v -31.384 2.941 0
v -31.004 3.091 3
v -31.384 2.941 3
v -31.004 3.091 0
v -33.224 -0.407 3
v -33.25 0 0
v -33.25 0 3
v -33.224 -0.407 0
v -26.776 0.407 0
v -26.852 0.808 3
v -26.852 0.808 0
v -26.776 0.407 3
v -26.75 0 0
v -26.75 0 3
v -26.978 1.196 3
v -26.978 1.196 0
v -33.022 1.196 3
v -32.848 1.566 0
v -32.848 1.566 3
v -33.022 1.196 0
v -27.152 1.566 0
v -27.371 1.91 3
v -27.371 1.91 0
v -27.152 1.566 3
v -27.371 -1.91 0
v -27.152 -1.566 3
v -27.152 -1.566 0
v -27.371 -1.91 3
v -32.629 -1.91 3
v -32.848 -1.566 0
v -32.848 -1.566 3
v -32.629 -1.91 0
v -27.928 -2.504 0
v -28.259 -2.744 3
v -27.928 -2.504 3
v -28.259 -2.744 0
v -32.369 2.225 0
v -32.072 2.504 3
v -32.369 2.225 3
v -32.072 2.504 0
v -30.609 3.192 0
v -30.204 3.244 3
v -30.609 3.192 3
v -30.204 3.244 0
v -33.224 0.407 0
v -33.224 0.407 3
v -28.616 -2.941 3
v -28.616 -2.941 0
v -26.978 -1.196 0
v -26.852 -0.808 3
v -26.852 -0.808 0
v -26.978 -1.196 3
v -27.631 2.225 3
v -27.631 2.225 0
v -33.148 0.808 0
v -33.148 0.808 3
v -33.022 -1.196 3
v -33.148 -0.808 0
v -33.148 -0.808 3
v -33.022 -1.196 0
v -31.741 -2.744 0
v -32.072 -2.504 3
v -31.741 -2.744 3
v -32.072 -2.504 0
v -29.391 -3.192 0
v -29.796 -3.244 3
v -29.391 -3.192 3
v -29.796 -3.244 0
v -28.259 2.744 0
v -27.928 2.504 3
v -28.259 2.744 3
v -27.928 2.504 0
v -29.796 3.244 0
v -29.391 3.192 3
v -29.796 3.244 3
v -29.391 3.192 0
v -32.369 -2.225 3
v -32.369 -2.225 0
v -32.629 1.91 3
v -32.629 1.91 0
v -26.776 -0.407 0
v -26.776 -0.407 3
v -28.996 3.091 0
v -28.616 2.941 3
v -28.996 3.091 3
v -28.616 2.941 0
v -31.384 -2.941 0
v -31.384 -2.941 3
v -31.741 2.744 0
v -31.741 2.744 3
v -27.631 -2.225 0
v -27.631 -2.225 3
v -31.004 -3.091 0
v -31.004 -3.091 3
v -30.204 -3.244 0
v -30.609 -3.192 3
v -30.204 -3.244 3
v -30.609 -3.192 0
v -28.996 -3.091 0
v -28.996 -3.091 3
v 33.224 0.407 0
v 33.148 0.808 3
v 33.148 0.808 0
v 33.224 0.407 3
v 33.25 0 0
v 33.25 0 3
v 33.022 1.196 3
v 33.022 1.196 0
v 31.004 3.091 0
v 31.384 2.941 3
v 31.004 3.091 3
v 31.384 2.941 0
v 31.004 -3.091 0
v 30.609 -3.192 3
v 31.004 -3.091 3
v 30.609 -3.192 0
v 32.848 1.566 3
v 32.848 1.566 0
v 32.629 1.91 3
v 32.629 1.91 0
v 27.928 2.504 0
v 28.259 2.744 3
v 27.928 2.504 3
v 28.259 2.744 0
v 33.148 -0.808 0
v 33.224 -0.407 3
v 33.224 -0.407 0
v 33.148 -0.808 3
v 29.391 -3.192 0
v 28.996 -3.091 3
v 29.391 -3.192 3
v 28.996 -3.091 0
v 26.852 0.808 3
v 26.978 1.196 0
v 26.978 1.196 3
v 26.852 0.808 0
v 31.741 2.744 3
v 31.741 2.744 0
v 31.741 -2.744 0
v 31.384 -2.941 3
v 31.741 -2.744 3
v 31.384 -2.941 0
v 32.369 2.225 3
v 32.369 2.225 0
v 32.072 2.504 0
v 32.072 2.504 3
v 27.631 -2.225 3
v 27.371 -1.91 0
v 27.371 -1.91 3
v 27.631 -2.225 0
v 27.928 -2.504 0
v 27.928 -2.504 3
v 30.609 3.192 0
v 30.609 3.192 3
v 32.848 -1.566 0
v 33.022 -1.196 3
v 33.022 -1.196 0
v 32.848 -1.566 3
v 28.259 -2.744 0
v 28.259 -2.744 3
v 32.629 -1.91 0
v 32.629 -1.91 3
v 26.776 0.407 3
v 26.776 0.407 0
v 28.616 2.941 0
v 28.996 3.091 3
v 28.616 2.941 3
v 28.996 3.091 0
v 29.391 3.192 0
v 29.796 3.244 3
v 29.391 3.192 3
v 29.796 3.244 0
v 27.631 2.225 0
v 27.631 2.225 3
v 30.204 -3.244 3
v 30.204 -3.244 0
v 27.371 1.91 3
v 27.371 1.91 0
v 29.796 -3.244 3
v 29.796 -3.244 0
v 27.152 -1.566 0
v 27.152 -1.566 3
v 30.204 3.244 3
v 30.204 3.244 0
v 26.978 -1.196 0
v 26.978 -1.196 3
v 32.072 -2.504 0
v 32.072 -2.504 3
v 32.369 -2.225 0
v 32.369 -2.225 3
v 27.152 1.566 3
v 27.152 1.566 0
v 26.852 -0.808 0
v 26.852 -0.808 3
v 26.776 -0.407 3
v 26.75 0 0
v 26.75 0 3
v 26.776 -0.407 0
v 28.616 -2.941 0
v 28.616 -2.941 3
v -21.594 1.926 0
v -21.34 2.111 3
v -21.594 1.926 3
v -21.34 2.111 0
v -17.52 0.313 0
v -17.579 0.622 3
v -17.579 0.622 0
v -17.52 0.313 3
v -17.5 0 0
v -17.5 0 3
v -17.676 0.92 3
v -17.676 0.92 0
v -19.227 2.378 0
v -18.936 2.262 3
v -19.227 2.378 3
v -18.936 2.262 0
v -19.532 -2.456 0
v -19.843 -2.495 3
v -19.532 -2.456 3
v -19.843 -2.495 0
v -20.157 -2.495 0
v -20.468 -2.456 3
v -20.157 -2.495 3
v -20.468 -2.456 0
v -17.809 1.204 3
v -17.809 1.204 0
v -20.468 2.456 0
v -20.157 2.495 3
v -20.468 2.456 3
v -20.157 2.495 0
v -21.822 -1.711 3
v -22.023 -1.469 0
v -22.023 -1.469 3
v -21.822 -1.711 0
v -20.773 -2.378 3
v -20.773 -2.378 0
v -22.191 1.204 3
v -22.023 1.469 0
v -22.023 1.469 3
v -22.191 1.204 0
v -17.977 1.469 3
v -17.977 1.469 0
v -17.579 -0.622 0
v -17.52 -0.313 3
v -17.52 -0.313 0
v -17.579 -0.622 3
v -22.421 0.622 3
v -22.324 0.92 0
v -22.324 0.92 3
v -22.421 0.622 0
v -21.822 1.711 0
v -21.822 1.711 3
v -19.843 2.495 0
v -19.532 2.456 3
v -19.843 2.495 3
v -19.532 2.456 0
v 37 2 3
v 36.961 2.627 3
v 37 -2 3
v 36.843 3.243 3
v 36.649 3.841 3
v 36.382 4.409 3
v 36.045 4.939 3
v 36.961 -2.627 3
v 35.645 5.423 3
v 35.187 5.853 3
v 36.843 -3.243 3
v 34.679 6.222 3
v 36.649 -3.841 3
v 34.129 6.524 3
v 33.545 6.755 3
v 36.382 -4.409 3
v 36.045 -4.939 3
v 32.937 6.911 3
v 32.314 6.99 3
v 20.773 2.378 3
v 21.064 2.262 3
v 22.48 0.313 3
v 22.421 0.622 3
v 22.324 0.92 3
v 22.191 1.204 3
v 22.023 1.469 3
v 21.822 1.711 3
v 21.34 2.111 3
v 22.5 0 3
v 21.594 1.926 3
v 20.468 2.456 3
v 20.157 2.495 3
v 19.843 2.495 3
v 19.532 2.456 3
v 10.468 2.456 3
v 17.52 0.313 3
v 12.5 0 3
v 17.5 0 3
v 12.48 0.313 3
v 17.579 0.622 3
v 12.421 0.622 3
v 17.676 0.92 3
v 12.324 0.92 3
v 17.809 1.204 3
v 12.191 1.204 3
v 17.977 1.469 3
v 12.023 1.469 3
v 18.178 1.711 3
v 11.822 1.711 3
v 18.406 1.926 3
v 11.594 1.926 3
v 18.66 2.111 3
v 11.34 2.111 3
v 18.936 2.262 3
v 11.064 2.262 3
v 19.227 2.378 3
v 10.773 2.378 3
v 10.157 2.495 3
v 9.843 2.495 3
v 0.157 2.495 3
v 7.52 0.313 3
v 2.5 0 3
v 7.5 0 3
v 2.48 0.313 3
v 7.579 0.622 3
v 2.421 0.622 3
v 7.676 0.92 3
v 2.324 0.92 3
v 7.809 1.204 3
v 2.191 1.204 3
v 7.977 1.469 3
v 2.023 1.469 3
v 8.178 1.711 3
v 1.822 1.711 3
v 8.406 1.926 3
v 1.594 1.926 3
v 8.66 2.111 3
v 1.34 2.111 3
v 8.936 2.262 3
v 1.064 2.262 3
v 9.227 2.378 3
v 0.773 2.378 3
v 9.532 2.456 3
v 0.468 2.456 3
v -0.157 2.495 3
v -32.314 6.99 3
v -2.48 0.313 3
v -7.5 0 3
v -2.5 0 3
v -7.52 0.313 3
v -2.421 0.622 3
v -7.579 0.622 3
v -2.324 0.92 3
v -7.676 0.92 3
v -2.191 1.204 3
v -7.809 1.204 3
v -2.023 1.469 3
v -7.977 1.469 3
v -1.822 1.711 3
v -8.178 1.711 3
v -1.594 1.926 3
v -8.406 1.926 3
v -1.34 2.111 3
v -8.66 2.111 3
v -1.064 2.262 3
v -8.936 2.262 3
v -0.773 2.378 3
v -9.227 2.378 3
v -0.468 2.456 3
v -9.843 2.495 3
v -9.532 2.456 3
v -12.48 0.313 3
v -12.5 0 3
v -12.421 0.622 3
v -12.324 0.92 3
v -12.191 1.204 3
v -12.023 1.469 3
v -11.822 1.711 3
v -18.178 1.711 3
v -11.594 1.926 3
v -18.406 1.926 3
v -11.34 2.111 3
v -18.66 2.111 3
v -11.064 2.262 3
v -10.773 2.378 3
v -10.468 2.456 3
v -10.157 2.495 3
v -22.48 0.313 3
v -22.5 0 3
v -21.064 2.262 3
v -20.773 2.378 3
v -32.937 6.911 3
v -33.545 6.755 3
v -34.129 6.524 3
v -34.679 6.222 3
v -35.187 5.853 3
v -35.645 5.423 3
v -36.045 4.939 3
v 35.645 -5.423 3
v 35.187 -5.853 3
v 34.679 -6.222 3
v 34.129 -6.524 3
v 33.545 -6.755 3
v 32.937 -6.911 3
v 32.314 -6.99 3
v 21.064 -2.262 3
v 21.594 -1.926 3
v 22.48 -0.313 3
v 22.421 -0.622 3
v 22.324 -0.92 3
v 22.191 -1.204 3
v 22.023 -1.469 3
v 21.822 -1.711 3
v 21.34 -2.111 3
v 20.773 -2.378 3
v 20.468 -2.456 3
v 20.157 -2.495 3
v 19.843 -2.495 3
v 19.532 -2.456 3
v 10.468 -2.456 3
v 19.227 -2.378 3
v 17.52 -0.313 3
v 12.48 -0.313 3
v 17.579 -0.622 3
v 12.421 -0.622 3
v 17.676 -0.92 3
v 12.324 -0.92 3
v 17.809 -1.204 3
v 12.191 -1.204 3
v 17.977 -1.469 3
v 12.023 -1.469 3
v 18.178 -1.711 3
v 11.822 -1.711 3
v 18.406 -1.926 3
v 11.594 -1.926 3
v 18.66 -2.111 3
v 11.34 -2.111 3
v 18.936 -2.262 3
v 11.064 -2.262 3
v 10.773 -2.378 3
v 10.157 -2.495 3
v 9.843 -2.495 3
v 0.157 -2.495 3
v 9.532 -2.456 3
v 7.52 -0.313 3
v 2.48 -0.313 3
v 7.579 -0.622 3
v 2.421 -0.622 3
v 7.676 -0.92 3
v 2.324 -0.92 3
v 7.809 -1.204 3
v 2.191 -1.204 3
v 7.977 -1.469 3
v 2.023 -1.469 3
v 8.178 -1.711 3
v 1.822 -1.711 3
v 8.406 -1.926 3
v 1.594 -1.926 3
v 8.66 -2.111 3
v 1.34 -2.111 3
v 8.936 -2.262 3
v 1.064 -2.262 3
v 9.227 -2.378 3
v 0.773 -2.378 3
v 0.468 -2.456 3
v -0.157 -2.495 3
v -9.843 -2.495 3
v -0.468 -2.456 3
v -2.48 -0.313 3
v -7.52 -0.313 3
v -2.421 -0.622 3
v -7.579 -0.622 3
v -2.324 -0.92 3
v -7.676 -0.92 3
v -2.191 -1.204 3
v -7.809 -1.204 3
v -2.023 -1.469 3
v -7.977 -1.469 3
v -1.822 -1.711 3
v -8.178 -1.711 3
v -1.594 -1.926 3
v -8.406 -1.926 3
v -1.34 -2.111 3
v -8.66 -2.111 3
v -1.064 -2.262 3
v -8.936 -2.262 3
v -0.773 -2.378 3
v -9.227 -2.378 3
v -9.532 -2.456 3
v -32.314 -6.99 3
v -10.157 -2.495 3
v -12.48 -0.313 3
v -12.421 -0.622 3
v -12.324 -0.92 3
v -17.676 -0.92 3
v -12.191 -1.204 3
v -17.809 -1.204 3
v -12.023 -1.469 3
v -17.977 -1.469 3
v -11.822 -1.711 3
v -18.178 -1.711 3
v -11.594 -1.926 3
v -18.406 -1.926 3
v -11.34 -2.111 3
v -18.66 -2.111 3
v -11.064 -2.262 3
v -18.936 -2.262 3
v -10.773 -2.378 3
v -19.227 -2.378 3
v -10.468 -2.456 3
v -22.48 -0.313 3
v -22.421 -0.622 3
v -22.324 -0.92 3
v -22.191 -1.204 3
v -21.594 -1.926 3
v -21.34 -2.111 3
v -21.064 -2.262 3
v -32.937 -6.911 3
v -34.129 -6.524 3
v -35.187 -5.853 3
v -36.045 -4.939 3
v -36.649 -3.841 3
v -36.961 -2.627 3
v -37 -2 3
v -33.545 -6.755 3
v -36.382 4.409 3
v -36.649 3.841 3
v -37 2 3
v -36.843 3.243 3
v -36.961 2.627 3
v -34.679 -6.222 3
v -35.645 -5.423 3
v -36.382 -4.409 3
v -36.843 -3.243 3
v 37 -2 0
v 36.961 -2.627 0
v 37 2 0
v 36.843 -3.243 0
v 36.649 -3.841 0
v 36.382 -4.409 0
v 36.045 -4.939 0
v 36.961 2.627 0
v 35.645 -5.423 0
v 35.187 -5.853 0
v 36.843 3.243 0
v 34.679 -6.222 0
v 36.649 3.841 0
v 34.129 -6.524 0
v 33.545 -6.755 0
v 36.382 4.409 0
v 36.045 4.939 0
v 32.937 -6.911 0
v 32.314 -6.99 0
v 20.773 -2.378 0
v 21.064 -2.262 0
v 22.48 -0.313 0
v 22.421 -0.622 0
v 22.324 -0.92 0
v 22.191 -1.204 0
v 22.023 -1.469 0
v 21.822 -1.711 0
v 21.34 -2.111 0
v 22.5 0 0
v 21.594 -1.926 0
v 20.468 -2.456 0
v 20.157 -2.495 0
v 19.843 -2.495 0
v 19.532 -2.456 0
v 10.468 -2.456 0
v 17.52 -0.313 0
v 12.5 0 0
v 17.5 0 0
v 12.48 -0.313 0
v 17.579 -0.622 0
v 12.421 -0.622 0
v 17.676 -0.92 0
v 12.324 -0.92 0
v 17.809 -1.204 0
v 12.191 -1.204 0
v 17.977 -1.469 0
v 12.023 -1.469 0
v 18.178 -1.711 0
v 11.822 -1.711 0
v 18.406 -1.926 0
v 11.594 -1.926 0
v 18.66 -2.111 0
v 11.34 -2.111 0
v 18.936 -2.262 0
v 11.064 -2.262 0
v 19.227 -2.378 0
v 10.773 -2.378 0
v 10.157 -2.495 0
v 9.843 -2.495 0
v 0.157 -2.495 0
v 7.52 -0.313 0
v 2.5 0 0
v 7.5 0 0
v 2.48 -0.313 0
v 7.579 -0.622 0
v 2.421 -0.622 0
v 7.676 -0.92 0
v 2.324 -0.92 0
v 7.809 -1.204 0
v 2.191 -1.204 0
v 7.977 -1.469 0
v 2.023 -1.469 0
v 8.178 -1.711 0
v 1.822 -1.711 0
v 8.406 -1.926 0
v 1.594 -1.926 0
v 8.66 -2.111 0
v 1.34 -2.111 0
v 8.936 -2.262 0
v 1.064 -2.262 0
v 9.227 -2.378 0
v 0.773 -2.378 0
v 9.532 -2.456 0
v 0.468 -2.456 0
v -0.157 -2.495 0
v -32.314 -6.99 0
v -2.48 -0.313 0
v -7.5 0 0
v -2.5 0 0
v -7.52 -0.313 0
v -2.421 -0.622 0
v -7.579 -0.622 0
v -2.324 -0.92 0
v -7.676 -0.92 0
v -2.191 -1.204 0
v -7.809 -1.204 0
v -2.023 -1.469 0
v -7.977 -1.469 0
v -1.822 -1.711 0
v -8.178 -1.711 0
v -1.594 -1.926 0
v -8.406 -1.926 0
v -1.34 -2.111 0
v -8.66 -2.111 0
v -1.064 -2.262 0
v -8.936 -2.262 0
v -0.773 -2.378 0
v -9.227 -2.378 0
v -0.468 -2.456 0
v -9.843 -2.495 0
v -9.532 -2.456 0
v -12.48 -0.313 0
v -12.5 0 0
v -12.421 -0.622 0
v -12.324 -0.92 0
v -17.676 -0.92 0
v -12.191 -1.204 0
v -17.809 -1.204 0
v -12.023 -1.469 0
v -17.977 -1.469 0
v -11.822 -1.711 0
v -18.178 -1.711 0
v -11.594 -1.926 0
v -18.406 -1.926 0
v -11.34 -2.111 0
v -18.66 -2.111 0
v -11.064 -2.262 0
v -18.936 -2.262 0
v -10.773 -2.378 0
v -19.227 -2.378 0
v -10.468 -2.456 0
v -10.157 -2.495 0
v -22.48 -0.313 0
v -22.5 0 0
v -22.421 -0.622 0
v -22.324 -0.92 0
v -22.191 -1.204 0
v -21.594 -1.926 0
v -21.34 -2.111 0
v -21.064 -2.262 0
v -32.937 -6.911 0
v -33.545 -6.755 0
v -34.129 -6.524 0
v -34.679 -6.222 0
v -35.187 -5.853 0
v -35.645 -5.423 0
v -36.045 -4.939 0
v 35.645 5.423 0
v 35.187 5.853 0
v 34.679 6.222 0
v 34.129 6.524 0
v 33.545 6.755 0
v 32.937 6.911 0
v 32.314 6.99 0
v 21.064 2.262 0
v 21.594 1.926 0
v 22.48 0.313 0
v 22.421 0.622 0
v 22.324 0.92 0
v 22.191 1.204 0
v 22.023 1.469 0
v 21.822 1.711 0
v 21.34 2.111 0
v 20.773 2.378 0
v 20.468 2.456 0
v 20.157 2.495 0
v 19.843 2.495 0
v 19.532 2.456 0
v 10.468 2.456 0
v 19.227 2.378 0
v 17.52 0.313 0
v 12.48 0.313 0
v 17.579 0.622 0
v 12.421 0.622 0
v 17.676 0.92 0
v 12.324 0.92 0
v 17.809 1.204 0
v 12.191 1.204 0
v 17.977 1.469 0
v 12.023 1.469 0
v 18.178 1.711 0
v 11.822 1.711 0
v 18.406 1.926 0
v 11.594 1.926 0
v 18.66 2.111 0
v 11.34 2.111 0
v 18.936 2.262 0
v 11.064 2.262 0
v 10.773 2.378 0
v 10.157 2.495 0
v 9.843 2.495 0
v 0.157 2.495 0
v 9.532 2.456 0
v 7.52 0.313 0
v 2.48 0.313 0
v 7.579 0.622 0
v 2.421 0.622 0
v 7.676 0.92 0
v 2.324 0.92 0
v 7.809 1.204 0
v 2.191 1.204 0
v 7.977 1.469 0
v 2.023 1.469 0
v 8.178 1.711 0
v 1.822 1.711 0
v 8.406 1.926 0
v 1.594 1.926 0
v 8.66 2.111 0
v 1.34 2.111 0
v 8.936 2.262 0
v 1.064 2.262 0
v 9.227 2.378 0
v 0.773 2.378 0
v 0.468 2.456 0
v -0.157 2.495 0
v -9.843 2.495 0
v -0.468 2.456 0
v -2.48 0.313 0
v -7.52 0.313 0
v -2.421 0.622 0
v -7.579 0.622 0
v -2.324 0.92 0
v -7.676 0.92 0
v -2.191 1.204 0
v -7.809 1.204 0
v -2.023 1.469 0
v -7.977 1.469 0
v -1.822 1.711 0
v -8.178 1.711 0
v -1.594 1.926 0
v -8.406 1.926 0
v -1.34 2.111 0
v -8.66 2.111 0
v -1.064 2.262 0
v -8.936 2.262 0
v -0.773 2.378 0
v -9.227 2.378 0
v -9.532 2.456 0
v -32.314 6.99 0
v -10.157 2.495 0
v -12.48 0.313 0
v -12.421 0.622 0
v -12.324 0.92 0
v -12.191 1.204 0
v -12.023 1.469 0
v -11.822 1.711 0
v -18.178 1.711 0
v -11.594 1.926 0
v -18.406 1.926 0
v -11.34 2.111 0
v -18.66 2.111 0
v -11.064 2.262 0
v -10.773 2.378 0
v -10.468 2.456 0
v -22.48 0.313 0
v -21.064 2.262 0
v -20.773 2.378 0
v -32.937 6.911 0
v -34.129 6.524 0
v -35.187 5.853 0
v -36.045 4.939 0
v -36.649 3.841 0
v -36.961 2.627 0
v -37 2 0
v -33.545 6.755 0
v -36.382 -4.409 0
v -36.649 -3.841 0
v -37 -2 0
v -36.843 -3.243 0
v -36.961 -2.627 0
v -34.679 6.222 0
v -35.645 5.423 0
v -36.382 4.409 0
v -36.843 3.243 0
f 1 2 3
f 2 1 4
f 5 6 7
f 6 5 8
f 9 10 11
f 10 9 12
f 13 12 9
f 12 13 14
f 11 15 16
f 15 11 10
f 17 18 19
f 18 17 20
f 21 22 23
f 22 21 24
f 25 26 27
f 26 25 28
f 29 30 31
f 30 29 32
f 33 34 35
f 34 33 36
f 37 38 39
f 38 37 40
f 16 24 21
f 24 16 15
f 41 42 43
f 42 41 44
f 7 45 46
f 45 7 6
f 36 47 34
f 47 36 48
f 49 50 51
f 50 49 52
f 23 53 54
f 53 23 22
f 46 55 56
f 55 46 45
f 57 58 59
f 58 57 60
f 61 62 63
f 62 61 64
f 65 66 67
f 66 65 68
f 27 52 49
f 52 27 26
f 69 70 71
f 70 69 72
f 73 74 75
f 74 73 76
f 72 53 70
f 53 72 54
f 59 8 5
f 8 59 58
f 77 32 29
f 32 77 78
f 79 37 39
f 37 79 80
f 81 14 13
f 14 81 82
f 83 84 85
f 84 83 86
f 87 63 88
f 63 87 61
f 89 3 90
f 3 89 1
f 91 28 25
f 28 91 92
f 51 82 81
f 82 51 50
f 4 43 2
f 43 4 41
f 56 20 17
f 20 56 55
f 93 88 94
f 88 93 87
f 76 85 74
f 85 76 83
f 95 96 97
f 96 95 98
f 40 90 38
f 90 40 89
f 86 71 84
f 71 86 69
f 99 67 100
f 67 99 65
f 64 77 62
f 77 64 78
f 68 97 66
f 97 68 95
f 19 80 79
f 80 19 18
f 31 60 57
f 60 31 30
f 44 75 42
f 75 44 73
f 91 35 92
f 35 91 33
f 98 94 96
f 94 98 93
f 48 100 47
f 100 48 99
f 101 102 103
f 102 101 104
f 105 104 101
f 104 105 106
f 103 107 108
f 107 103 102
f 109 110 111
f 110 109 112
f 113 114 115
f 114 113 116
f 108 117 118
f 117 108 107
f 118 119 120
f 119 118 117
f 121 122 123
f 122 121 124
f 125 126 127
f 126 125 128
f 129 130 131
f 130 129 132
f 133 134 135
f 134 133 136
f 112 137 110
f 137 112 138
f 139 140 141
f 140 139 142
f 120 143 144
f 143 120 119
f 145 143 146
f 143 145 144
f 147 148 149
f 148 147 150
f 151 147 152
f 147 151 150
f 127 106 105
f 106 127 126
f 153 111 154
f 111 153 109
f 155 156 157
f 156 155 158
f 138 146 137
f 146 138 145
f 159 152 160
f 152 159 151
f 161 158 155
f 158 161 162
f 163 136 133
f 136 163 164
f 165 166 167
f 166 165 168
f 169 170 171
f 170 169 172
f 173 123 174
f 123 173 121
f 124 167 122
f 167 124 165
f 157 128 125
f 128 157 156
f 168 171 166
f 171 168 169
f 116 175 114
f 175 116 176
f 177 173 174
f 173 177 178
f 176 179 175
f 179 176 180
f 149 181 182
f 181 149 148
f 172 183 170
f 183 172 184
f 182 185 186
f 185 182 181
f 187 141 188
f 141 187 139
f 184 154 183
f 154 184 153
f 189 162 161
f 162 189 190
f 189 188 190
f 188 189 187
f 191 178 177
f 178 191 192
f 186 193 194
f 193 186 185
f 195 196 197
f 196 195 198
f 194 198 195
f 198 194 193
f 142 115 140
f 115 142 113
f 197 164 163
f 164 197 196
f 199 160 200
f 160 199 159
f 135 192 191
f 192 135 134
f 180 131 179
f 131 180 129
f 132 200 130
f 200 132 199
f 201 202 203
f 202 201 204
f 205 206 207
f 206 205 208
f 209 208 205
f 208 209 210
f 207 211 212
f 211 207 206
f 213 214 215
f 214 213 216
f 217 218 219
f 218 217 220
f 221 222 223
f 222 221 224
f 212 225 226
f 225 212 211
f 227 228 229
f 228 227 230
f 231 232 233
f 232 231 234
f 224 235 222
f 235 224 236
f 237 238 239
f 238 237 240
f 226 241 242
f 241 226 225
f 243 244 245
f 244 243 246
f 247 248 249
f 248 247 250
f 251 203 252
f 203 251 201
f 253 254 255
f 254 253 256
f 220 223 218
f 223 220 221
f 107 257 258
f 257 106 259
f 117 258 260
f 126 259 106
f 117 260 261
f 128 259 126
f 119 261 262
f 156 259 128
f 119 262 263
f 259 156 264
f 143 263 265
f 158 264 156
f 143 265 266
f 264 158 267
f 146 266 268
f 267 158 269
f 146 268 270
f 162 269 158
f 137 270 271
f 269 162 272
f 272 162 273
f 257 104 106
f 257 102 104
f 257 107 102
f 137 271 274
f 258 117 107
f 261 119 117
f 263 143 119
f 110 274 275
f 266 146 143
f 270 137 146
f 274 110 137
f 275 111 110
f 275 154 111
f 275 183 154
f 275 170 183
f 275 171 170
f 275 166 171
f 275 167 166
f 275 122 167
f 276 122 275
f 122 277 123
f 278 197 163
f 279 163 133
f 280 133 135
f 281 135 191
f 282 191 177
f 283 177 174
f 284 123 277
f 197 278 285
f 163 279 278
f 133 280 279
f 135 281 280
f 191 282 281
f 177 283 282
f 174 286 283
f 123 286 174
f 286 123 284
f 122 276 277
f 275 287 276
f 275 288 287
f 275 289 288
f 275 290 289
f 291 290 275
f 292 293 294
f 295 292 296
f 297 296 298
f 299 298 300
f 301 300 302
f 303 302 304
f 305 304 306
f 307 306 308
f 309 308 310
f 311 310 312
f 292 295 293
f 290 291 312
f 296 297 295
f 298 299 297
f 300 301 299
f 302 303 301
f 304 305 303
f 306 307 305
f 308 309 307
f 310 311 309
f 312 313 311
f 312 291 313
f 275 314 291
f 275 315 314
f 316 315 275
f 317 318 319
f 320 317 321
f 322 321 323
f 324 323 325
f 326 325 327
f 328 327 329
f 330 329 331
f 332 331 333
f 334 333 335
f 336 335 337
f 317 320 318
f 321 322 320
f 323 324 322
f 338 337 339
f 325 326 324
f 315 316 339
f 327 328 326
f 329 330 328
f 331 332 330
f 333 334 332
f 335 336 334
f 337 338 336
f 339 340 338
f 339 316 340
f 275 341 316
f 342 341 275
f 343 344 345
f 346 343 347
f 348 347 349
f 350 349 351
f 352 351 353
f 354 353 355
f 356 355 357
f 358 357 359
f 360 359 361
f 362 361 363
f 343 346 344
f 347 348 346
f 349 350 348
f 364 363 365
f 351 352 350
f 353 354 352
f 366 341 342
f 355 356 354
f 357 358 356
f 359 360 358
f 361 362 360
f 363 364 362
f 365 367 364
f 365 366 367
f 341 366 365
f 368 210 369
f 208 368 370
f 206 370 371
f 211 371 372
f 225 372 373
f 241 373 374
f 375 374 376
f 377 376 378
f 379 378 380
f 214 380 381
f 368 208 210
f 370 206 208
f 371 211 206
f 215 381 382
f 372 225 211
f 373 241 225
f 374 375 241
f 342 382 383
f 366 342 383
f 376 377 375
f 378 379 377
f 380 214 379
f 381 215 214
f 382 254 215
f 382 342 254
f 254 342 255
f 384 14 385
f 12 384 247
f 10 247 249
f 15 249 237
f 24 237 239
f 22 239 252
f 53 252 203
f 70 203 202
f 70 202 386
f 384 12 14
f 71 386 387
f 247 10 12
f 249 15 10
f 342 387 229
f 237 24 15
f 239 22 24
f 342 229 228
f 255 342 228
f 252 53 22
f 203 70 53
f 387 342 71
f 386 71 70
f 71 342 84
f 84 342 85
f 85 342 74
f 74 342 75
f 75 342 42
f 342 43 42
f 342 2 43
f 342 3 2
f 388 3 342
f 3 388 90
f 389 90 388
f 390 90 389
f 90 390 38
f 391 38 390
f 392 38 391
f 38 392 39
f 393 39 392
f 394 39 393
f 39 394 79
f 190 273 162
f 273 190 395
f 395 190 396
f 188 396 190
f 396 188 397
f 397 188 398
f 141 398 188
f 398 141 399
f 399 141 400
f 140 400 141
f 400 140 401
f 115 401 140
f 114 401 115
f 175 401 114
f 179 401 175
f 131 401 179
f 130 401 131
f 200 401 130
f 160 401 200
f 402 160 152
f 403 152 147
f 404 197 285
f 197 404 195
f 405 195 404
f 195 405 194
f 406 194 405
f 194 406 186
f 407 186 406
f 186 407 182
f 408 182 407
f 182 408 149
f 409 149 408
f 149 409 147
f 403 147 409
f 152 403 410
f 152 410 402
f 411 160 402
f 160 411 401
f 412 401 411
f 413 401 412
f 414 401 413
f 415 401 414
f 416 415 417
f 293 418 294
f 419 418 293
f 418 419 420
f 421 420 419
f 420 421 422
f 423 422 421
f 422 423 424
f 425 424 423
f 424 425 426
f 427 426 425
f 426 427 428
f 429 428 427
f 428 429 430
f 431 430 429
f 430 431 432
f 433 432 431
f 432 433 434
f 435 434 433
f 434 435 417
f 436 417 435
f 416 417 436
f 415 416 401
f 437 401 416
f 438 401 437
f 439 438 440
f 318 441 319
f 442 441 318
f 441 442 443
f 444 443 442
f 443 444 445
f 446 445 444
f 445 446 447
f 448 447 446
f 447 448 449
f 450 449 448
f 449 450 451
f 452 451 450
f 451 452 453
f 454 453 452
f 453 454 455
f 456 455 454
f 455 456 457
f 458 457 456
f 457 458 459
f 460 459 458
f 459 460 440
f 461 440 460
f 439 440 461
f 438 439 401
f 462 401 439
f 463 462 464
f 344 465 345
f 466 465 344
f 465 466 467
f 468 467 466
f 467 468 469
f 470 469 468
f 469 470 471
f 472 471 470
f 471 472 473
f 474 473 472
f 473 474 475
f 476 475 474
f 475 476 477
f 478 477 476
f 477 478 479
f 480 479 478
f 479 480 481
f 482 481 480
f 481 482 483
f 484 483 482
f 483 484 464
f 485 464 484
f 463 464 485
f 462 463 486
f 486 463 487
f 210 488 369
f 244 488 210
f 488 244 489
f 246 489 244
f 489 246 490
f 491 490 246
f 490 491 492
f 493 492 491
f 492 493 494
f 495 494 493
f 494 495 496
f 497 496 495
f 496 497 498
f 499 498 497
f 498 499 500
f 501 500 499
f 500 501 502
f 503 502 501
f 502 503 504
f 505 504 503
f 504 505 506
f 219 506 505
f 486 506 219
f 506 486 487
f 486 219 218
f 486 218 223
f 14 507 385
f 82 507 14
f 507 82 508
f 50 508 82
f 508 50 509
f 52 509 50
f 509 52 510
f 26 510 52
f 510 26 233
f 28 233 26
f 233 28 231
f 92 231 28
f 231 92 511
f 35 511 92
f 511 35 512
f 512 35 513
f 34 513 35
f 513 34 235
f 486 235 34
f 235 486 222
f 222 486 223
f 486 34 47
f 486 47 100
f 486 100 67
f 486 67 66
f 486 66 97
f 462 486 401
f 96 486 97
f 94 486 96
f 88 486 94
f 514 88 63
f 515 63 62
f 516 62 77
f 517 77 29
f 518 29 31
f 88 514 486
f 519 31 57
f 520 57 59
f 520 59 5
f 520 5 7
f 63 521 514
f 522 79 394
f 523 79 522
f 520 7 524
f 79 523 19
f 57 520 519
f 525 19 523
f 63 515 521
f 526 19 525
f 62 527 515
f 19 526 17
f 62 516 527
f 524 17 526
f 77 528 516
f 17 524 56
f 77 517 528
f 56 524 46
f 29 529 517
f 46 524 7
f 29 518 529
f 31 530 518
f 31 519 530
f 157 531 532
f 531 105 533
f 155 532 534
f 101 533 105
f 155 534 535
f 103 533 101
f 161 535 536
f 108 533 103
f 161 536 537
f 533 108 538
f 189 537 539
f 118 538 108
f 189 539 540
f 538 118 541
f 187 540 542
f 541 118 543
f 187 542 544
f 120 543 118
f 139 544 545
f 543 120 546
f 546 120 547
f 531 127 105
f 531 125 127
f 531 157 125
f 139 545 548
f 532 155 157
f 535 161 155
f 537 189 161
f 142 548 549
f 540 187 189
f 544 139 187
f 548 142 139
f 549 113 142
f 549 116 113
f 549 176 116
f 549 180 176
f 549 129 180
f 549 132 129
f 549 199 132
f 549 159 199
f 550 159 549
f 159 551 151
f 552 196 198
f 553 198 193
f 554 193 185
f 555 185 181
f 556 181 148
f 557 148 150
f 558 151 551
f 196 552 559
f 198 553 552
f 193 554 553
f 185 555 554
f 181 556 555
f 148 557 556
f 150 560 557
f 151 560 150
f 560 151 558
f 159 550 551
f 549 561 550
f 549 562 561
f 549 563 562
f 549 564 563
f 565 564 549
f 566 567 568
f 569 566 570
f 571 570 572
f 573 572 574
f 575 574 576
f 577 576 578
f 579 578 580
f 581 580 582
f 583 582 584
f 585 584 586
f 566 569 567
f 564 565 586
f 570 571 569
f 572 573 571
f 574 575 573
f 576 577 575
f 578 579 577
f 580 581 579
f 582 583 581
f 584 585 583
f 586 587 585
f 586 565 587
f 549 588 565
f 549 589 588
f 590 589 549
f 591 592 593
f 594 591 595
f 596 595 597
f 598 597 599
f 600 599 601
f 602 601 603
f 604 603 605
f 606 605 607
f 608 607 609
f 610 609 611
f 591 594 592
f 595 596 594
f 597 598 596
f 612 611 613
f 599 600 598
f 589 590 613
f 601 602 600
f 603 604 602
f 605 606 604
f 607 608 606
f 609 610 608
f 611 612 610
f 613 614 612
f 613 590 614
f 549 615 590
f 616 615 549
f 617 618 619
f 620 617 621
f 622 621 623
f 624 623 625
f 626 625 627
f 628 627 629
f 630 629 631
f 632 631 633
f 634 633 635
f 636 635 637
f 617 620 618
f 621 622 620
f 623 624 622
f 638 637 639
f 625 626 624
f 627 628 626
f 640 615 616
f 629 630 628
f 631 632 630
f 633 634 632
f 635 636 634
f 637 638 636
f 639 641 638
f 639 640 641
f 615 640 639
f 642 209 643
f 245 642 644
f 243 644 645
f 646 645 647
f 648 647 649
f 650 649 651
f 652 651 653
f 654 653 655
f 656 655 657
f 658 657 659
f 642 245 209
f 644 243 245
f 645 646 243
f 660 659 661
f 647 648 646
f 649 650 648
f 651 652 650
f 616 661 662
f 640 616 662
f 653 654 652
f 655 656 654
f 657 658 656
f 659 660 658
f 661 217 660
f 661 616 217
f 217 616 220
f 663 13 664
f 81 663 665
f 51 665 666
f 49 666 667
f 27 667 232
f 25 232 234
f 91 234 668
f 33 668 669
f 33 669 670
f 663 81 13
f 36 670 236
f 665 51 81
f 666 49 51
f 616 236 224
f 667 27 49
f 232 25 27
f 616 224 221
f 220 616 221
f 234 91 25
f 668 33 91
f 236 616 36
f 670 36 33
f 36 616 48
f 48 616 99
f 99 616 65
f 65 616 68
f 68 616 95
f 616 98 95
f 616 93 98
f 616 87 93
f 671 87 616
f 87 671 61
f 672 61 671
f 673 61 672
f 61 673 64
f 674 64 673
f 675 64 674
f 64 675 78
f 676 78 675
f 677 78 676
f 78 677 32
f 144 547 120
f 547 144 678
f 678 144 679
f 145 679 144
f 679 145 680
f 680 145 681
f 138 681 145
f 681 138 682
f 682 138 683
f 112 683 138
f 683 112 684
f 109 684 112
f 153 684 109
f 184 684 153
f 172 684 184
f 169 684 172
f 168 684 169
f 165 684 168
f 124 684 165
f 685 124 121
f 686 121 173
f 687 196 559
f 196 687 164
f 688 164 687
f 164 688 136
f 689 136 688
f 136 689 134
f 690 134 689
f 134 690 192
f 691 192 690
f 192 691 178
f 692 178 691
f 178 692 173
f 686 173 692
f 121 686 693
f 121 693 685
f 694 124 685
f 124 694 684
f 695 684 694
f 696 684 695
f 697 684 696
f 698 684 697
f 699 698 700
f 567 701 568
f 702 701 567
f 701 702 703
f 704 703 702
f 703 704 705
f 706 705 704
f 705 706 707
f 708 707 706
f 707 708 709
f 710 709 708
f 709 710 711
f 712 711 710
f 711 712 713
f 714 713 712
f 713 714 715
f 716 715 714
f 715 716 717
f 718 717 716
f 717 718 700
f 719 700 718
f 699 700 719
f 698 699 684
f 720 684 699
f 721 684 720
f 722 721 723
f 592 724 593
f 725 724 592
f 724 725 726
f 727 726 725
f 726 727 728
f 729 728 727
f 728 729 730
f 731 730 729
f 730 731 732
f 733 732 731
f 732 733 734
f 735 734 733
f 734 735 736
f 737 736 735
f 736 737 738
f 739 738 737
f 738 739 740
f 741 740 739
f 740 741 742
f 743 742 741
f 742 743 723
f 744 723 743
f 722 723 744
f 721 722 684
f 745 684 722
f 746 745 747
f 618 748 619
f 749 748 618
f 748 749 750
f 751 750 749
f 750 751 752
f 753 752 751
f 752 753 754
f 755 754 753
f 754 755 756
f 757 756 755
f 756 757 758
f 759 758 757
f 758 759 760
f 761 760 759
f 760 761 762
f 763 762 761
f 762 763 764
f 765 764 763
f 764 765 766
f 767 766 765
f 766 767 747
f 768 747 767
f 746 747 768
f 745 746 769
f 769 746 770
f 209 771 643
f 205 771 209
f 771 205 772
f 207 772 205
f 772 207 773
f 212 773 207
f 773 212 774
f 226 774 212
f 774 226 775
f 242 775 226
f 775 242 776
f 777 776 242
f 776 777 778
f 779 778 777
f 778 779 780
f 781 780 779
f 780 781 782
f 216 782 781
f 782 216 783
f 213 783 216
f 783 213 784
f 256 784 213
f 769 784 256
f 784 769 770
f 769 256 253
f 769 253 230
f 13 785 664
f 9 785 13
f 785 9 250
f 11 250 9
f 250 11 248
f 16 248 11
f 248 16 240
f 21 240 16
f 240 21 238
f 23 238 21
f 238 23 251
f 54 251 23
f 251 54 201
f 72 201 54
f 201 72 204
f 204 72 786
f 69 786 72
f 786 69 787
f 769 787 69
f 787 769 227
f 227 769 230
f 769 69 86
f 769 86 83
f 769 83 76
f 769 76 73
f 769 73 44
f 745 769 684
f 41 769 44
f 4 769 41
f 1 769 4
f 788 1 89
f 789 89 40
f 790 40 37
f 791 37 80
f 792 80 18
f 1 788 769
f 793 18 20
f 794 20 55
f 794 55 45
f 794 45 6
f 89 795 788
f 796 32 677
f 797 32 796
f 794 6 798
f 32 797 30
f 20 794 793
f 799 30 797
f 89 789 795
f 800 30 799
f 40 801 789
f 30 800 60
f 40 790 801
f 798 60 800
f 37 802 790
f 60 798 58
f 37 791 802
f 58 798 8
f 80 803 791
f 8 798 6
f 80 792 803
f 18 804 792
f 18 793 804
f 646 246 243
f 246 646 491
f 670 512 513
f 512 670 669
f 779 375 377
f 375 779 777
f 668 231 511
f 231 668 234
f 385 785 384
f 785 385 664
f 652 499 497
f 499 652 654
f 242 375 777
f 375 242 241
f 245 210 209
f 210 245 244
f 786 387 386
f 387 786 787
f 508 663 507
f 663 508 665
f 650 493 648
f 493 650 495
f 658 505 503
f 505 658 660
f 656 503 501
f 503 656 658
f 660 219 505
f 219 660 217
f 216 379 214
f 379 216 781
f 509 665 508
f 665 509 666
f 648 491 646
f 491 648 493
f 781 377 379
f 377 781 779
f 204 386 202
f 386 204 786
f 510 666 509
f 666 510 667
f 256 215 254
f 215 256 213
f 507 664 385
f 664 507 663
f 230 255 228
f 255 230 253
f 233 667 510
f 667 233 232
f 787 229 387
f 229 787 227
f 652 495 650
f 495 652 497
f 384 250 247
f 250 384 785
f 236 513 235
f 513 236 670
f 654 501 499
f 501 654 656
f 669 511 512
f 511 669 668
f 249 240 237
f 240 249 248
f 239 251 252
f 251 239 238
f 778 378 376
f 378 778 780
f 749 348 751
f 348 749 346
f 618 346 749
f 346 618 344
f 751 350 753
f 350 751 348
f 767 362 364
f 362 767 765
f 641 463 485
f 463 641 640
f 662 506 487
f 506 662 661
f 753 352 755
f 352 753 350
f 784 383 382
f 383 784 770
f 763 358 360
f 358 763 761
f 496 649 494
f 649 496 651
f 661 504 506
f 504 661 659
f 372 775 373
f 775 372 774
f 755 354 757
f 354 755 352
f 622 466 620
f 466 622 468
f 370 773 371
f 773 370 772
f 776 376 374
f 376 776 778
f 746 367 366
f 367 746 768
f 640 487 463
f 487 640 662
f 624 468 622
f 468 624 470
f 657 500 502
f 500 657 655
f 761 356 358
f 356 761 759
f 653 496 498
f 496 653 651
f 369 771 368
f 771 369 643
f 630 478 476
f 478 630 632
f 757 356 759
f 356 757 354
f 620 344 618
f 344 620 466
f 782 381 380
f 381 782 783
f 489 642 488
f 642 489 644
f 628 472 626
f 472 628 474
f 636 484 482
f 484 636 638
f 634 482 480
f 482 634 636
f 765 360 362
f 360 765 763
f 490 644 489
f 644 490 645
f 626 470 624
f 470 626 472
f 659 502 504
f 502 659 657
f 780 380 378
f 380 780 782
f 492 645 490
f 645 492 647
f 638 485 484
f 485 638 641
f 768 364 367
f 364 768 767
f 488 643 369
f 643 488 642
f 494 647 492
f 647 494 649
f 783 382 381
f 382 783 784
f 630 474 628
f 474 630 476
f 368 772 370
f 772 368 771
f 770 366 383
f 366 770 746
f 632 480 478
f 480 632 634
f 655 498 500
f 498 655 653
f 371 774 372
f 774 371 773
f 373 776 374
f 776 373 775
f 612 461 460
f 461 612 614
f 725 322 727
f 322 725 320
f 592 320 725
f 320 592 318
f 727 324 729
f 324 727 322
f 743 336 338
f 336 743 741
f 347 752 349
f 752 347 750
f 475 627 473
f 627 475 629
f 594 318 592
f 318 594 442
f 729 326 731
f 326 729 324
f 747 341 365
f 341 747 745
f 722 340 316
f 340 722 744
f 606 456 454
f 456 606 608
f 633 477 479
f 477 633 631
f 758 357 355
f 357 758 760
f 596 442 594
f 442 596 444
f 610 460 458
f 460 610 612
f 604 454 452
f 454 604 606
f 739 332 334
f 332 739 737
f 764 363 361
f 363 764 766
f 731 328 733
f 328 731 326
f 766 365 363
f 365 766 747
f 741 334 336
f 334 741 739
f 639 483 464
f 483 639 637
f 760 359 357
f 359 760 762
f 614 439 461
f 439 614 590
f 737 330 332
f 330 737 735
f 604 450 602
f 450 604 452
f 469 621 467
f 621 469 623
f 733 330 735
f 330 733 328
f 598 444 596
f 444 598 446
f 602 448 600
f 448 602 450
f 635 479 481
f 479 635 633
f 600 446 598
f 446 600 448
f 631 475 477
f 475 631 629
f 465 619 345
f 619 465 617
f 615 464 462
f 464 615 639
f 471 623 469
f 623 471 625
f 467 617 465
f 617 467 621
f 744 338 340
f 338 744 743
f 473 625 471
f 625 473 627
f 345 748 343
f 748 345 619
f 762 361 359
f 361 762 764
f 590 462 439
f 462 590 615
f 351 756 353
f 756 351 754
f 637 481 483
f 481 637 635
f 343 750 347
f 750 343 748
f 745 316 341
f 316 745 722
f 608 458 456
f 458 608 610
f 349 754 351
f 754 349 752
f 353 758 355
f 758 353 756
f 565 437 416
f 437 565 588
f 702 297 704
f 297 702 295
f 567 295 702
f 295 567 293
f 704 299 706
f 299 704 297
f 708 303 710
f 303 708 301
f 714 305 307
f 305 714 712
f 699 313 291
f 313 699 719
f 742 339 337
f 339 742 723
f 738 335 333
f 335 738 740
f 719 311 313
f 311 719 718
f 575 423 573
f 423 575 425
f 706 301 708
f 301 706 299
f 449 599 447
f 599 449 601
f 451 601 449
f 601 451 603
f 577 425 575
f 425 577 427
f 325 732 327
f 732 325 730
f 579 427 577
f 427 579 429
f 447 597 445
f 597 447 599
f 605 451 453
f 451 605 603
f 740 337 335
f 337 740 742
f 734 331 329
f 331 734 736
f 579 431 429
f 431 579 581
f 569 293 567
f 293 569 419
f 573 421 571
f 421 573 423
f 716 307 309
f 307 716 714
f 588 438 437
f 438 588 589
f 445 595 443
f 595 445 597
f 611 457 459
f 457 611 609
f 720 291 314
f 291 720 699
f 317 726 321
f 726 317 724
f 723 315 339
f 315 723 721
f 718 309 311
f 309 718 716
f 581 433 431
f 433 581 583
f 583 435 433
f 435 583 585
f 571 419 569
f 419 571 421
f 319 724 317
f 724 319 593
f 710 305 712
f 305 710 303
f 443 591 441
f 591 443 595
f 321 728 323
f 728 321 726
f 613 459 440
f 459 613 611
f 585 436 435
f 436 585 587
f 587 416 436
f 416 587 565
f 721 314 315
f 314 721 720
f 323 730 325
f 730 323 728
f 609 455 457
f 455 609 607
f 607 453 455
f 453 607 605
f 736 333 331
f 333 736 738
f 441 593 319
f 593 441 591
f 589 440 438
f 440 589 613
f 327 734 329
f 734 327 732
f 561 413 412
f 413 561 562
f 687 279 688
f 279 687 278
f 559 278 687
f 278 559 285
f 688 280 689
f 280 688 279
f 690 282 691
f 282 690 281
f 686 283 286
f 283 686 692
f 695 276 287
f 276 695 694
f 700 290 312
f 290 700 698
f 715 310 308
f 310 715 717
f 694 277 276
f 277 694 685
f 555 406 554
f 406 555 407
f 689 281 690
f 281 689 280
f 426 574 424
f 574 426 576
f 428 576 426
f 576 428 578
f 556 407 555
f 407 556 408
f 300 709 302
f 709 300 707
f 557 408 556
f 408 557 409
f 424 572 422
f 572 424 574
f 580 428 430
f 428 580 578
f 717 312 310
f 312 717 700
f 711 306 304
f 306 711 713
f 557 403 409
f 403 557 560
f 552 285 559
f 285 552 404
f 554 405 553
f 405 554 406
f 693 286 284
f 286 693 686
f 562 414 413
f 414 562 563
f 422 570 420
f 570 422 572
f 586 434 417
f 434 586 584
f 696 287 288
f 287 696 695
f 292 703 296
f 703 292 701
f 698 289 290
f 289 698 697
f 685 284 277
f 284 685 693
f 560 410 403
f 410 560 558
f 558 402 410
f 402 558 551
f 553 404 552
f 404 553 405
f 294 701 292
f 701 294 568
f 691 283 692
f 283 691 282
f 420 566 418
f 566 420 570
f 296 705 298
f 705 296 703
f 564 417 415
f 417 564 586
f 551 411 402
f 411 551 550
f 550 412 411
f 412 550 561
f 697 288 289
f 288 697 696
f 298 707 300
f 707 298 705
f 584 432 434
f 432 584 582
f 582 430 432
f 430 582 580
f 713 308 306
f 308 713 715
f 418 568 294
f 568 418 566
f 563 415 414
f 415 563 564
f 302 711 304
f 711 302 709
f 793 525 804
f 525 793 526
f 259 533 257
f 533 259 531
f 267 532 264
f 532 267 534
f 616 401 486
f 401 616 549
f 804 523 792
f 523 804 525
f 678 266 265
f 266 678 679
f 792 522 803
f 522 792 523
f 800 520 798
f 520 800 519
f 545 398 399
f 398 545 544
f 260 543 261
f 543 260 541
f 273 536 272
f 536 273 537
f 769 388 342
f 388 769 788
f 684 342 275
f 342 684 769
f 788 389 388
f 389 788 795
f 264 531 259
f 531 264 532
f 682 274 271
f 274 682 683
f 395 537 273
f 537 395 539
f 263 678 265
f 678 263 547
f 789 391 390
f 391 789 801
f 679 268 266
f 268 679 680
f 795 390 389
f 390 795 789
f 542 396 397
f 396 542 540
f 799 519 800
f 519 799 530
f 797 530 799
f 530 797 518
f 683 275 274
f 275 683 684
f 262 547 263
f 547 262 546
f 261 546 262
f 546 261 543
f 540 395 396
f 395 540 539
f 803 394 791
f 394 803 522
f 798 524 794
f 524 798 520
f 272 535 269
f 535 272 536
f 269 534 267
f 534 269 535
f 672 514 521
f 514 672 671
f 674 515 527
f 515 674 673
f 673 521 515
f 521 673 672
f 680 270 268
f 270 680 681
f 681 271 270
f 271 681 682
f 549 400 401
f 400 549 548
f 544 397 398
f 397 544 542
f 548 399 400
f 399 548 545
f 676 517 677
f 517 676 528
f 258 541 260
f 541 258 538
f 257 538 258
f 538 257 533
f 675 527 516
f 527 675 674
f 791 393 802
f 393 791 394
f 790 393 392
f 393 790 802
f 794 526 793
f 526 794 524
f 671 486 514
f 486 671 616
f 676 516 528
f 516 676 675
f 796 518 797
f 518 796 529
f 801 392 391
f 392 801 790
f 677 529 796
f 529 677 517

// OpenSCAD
$fn = 50;


difference() {
	union() {
		hull() {
			translate(v = [-32.0000000000, 2.0000000000, 0]) {
				cylinder(h = 3, r = 5);
			}
			translate(v = [32.0000000000, 2.0000000000, 0]) {
				cylinder(h = 3, r = 5);
			}
			translate(v = [-32.0000000000, -2.0000000000, 0]) {
				cylinder(h = 3, r = 5);
			}
			translate(v = [32.0000000000, -2.0000000000, 0]) {
				cylinder(h = 3, r = 5);
			}
		}
	}
	union() {
		#translate(v = [-30.0000000000, 0.0000000000, 0]) {
			cylinder(h = 3, r = 3.2500000000);
		}
		#translate(v = [30.0000000000, 0.0000000000, 0]) {
			cylinder(h = 3, r = 3.2500000000);
		}
		#translate(v = [-30.0000000000, 0.0000000000, -100.0000000000]) {
			cylinder(h = 200, r = 3.2500000000);
		}
		#translate(v = [-30.0000000000, 0.0000000000, -100.0000000000]) {
			cylinder(h = 200, r = 3.2500000000);
		}
		#translate(v = [30.0000000000, 0.0000000000, -100.0000000000]) {
			cylinder(h = 200, r = 3.2500000000);
		}
		#translate(v = [30.0000000000, 0.0000000000, -100.0000000000]) {
			cylinder(h = 200, r = 3.2500000000);
		}
		#translate(v = [-30.0000000000, 0.0000000000, 0]) {
			cylinder(h = 3, r = 1.8000000000);
		}
		#translate(v = [30.0000000000, 0.0000000000, 0]) {
			cylinder(h = 3, r = 1.8000000000);
		}
		#translate(v = [-30.0000000000, 0.0000000000, 0]) {
			cylinder(h = 3, r = 1.8000000000);
		}
		#translate(v = [30.0000000000, 0.0000000000, 0]) {
			cylinder(h = 3, r = 1.8000000000);
		}
		#translate(v = [-30.0000000000, 0.0000000000, 0]) {
			cylinder(h = 3, r = 1.8000000000);
		}
		#translate(v = [30.0000000000, 0.0000000000, 0]) {
			cylinder(h = 3, r = 1.8000000000);
		}
		#translate(v = [-20.0000000000, 0, 0]) {
			cylinder(h = 3, r = 2.5000000000);
		}
		#translate(v = [-10.0000000000, 0, 0]) {
			cylinder(h = 3, r = 2.5000000000);
		}
		#cylinder(h = 3, r = 2.5000000000);
		#translate(v = [10.0000000000, 0, 0]) {
			cylinder(h = 3, r = 2.5000000000);
		}
		#translate(v = [20.0000000000, 0, 0]) {
			cylinder(h = 3, r = 2.5000000000);
		}
	}
}
